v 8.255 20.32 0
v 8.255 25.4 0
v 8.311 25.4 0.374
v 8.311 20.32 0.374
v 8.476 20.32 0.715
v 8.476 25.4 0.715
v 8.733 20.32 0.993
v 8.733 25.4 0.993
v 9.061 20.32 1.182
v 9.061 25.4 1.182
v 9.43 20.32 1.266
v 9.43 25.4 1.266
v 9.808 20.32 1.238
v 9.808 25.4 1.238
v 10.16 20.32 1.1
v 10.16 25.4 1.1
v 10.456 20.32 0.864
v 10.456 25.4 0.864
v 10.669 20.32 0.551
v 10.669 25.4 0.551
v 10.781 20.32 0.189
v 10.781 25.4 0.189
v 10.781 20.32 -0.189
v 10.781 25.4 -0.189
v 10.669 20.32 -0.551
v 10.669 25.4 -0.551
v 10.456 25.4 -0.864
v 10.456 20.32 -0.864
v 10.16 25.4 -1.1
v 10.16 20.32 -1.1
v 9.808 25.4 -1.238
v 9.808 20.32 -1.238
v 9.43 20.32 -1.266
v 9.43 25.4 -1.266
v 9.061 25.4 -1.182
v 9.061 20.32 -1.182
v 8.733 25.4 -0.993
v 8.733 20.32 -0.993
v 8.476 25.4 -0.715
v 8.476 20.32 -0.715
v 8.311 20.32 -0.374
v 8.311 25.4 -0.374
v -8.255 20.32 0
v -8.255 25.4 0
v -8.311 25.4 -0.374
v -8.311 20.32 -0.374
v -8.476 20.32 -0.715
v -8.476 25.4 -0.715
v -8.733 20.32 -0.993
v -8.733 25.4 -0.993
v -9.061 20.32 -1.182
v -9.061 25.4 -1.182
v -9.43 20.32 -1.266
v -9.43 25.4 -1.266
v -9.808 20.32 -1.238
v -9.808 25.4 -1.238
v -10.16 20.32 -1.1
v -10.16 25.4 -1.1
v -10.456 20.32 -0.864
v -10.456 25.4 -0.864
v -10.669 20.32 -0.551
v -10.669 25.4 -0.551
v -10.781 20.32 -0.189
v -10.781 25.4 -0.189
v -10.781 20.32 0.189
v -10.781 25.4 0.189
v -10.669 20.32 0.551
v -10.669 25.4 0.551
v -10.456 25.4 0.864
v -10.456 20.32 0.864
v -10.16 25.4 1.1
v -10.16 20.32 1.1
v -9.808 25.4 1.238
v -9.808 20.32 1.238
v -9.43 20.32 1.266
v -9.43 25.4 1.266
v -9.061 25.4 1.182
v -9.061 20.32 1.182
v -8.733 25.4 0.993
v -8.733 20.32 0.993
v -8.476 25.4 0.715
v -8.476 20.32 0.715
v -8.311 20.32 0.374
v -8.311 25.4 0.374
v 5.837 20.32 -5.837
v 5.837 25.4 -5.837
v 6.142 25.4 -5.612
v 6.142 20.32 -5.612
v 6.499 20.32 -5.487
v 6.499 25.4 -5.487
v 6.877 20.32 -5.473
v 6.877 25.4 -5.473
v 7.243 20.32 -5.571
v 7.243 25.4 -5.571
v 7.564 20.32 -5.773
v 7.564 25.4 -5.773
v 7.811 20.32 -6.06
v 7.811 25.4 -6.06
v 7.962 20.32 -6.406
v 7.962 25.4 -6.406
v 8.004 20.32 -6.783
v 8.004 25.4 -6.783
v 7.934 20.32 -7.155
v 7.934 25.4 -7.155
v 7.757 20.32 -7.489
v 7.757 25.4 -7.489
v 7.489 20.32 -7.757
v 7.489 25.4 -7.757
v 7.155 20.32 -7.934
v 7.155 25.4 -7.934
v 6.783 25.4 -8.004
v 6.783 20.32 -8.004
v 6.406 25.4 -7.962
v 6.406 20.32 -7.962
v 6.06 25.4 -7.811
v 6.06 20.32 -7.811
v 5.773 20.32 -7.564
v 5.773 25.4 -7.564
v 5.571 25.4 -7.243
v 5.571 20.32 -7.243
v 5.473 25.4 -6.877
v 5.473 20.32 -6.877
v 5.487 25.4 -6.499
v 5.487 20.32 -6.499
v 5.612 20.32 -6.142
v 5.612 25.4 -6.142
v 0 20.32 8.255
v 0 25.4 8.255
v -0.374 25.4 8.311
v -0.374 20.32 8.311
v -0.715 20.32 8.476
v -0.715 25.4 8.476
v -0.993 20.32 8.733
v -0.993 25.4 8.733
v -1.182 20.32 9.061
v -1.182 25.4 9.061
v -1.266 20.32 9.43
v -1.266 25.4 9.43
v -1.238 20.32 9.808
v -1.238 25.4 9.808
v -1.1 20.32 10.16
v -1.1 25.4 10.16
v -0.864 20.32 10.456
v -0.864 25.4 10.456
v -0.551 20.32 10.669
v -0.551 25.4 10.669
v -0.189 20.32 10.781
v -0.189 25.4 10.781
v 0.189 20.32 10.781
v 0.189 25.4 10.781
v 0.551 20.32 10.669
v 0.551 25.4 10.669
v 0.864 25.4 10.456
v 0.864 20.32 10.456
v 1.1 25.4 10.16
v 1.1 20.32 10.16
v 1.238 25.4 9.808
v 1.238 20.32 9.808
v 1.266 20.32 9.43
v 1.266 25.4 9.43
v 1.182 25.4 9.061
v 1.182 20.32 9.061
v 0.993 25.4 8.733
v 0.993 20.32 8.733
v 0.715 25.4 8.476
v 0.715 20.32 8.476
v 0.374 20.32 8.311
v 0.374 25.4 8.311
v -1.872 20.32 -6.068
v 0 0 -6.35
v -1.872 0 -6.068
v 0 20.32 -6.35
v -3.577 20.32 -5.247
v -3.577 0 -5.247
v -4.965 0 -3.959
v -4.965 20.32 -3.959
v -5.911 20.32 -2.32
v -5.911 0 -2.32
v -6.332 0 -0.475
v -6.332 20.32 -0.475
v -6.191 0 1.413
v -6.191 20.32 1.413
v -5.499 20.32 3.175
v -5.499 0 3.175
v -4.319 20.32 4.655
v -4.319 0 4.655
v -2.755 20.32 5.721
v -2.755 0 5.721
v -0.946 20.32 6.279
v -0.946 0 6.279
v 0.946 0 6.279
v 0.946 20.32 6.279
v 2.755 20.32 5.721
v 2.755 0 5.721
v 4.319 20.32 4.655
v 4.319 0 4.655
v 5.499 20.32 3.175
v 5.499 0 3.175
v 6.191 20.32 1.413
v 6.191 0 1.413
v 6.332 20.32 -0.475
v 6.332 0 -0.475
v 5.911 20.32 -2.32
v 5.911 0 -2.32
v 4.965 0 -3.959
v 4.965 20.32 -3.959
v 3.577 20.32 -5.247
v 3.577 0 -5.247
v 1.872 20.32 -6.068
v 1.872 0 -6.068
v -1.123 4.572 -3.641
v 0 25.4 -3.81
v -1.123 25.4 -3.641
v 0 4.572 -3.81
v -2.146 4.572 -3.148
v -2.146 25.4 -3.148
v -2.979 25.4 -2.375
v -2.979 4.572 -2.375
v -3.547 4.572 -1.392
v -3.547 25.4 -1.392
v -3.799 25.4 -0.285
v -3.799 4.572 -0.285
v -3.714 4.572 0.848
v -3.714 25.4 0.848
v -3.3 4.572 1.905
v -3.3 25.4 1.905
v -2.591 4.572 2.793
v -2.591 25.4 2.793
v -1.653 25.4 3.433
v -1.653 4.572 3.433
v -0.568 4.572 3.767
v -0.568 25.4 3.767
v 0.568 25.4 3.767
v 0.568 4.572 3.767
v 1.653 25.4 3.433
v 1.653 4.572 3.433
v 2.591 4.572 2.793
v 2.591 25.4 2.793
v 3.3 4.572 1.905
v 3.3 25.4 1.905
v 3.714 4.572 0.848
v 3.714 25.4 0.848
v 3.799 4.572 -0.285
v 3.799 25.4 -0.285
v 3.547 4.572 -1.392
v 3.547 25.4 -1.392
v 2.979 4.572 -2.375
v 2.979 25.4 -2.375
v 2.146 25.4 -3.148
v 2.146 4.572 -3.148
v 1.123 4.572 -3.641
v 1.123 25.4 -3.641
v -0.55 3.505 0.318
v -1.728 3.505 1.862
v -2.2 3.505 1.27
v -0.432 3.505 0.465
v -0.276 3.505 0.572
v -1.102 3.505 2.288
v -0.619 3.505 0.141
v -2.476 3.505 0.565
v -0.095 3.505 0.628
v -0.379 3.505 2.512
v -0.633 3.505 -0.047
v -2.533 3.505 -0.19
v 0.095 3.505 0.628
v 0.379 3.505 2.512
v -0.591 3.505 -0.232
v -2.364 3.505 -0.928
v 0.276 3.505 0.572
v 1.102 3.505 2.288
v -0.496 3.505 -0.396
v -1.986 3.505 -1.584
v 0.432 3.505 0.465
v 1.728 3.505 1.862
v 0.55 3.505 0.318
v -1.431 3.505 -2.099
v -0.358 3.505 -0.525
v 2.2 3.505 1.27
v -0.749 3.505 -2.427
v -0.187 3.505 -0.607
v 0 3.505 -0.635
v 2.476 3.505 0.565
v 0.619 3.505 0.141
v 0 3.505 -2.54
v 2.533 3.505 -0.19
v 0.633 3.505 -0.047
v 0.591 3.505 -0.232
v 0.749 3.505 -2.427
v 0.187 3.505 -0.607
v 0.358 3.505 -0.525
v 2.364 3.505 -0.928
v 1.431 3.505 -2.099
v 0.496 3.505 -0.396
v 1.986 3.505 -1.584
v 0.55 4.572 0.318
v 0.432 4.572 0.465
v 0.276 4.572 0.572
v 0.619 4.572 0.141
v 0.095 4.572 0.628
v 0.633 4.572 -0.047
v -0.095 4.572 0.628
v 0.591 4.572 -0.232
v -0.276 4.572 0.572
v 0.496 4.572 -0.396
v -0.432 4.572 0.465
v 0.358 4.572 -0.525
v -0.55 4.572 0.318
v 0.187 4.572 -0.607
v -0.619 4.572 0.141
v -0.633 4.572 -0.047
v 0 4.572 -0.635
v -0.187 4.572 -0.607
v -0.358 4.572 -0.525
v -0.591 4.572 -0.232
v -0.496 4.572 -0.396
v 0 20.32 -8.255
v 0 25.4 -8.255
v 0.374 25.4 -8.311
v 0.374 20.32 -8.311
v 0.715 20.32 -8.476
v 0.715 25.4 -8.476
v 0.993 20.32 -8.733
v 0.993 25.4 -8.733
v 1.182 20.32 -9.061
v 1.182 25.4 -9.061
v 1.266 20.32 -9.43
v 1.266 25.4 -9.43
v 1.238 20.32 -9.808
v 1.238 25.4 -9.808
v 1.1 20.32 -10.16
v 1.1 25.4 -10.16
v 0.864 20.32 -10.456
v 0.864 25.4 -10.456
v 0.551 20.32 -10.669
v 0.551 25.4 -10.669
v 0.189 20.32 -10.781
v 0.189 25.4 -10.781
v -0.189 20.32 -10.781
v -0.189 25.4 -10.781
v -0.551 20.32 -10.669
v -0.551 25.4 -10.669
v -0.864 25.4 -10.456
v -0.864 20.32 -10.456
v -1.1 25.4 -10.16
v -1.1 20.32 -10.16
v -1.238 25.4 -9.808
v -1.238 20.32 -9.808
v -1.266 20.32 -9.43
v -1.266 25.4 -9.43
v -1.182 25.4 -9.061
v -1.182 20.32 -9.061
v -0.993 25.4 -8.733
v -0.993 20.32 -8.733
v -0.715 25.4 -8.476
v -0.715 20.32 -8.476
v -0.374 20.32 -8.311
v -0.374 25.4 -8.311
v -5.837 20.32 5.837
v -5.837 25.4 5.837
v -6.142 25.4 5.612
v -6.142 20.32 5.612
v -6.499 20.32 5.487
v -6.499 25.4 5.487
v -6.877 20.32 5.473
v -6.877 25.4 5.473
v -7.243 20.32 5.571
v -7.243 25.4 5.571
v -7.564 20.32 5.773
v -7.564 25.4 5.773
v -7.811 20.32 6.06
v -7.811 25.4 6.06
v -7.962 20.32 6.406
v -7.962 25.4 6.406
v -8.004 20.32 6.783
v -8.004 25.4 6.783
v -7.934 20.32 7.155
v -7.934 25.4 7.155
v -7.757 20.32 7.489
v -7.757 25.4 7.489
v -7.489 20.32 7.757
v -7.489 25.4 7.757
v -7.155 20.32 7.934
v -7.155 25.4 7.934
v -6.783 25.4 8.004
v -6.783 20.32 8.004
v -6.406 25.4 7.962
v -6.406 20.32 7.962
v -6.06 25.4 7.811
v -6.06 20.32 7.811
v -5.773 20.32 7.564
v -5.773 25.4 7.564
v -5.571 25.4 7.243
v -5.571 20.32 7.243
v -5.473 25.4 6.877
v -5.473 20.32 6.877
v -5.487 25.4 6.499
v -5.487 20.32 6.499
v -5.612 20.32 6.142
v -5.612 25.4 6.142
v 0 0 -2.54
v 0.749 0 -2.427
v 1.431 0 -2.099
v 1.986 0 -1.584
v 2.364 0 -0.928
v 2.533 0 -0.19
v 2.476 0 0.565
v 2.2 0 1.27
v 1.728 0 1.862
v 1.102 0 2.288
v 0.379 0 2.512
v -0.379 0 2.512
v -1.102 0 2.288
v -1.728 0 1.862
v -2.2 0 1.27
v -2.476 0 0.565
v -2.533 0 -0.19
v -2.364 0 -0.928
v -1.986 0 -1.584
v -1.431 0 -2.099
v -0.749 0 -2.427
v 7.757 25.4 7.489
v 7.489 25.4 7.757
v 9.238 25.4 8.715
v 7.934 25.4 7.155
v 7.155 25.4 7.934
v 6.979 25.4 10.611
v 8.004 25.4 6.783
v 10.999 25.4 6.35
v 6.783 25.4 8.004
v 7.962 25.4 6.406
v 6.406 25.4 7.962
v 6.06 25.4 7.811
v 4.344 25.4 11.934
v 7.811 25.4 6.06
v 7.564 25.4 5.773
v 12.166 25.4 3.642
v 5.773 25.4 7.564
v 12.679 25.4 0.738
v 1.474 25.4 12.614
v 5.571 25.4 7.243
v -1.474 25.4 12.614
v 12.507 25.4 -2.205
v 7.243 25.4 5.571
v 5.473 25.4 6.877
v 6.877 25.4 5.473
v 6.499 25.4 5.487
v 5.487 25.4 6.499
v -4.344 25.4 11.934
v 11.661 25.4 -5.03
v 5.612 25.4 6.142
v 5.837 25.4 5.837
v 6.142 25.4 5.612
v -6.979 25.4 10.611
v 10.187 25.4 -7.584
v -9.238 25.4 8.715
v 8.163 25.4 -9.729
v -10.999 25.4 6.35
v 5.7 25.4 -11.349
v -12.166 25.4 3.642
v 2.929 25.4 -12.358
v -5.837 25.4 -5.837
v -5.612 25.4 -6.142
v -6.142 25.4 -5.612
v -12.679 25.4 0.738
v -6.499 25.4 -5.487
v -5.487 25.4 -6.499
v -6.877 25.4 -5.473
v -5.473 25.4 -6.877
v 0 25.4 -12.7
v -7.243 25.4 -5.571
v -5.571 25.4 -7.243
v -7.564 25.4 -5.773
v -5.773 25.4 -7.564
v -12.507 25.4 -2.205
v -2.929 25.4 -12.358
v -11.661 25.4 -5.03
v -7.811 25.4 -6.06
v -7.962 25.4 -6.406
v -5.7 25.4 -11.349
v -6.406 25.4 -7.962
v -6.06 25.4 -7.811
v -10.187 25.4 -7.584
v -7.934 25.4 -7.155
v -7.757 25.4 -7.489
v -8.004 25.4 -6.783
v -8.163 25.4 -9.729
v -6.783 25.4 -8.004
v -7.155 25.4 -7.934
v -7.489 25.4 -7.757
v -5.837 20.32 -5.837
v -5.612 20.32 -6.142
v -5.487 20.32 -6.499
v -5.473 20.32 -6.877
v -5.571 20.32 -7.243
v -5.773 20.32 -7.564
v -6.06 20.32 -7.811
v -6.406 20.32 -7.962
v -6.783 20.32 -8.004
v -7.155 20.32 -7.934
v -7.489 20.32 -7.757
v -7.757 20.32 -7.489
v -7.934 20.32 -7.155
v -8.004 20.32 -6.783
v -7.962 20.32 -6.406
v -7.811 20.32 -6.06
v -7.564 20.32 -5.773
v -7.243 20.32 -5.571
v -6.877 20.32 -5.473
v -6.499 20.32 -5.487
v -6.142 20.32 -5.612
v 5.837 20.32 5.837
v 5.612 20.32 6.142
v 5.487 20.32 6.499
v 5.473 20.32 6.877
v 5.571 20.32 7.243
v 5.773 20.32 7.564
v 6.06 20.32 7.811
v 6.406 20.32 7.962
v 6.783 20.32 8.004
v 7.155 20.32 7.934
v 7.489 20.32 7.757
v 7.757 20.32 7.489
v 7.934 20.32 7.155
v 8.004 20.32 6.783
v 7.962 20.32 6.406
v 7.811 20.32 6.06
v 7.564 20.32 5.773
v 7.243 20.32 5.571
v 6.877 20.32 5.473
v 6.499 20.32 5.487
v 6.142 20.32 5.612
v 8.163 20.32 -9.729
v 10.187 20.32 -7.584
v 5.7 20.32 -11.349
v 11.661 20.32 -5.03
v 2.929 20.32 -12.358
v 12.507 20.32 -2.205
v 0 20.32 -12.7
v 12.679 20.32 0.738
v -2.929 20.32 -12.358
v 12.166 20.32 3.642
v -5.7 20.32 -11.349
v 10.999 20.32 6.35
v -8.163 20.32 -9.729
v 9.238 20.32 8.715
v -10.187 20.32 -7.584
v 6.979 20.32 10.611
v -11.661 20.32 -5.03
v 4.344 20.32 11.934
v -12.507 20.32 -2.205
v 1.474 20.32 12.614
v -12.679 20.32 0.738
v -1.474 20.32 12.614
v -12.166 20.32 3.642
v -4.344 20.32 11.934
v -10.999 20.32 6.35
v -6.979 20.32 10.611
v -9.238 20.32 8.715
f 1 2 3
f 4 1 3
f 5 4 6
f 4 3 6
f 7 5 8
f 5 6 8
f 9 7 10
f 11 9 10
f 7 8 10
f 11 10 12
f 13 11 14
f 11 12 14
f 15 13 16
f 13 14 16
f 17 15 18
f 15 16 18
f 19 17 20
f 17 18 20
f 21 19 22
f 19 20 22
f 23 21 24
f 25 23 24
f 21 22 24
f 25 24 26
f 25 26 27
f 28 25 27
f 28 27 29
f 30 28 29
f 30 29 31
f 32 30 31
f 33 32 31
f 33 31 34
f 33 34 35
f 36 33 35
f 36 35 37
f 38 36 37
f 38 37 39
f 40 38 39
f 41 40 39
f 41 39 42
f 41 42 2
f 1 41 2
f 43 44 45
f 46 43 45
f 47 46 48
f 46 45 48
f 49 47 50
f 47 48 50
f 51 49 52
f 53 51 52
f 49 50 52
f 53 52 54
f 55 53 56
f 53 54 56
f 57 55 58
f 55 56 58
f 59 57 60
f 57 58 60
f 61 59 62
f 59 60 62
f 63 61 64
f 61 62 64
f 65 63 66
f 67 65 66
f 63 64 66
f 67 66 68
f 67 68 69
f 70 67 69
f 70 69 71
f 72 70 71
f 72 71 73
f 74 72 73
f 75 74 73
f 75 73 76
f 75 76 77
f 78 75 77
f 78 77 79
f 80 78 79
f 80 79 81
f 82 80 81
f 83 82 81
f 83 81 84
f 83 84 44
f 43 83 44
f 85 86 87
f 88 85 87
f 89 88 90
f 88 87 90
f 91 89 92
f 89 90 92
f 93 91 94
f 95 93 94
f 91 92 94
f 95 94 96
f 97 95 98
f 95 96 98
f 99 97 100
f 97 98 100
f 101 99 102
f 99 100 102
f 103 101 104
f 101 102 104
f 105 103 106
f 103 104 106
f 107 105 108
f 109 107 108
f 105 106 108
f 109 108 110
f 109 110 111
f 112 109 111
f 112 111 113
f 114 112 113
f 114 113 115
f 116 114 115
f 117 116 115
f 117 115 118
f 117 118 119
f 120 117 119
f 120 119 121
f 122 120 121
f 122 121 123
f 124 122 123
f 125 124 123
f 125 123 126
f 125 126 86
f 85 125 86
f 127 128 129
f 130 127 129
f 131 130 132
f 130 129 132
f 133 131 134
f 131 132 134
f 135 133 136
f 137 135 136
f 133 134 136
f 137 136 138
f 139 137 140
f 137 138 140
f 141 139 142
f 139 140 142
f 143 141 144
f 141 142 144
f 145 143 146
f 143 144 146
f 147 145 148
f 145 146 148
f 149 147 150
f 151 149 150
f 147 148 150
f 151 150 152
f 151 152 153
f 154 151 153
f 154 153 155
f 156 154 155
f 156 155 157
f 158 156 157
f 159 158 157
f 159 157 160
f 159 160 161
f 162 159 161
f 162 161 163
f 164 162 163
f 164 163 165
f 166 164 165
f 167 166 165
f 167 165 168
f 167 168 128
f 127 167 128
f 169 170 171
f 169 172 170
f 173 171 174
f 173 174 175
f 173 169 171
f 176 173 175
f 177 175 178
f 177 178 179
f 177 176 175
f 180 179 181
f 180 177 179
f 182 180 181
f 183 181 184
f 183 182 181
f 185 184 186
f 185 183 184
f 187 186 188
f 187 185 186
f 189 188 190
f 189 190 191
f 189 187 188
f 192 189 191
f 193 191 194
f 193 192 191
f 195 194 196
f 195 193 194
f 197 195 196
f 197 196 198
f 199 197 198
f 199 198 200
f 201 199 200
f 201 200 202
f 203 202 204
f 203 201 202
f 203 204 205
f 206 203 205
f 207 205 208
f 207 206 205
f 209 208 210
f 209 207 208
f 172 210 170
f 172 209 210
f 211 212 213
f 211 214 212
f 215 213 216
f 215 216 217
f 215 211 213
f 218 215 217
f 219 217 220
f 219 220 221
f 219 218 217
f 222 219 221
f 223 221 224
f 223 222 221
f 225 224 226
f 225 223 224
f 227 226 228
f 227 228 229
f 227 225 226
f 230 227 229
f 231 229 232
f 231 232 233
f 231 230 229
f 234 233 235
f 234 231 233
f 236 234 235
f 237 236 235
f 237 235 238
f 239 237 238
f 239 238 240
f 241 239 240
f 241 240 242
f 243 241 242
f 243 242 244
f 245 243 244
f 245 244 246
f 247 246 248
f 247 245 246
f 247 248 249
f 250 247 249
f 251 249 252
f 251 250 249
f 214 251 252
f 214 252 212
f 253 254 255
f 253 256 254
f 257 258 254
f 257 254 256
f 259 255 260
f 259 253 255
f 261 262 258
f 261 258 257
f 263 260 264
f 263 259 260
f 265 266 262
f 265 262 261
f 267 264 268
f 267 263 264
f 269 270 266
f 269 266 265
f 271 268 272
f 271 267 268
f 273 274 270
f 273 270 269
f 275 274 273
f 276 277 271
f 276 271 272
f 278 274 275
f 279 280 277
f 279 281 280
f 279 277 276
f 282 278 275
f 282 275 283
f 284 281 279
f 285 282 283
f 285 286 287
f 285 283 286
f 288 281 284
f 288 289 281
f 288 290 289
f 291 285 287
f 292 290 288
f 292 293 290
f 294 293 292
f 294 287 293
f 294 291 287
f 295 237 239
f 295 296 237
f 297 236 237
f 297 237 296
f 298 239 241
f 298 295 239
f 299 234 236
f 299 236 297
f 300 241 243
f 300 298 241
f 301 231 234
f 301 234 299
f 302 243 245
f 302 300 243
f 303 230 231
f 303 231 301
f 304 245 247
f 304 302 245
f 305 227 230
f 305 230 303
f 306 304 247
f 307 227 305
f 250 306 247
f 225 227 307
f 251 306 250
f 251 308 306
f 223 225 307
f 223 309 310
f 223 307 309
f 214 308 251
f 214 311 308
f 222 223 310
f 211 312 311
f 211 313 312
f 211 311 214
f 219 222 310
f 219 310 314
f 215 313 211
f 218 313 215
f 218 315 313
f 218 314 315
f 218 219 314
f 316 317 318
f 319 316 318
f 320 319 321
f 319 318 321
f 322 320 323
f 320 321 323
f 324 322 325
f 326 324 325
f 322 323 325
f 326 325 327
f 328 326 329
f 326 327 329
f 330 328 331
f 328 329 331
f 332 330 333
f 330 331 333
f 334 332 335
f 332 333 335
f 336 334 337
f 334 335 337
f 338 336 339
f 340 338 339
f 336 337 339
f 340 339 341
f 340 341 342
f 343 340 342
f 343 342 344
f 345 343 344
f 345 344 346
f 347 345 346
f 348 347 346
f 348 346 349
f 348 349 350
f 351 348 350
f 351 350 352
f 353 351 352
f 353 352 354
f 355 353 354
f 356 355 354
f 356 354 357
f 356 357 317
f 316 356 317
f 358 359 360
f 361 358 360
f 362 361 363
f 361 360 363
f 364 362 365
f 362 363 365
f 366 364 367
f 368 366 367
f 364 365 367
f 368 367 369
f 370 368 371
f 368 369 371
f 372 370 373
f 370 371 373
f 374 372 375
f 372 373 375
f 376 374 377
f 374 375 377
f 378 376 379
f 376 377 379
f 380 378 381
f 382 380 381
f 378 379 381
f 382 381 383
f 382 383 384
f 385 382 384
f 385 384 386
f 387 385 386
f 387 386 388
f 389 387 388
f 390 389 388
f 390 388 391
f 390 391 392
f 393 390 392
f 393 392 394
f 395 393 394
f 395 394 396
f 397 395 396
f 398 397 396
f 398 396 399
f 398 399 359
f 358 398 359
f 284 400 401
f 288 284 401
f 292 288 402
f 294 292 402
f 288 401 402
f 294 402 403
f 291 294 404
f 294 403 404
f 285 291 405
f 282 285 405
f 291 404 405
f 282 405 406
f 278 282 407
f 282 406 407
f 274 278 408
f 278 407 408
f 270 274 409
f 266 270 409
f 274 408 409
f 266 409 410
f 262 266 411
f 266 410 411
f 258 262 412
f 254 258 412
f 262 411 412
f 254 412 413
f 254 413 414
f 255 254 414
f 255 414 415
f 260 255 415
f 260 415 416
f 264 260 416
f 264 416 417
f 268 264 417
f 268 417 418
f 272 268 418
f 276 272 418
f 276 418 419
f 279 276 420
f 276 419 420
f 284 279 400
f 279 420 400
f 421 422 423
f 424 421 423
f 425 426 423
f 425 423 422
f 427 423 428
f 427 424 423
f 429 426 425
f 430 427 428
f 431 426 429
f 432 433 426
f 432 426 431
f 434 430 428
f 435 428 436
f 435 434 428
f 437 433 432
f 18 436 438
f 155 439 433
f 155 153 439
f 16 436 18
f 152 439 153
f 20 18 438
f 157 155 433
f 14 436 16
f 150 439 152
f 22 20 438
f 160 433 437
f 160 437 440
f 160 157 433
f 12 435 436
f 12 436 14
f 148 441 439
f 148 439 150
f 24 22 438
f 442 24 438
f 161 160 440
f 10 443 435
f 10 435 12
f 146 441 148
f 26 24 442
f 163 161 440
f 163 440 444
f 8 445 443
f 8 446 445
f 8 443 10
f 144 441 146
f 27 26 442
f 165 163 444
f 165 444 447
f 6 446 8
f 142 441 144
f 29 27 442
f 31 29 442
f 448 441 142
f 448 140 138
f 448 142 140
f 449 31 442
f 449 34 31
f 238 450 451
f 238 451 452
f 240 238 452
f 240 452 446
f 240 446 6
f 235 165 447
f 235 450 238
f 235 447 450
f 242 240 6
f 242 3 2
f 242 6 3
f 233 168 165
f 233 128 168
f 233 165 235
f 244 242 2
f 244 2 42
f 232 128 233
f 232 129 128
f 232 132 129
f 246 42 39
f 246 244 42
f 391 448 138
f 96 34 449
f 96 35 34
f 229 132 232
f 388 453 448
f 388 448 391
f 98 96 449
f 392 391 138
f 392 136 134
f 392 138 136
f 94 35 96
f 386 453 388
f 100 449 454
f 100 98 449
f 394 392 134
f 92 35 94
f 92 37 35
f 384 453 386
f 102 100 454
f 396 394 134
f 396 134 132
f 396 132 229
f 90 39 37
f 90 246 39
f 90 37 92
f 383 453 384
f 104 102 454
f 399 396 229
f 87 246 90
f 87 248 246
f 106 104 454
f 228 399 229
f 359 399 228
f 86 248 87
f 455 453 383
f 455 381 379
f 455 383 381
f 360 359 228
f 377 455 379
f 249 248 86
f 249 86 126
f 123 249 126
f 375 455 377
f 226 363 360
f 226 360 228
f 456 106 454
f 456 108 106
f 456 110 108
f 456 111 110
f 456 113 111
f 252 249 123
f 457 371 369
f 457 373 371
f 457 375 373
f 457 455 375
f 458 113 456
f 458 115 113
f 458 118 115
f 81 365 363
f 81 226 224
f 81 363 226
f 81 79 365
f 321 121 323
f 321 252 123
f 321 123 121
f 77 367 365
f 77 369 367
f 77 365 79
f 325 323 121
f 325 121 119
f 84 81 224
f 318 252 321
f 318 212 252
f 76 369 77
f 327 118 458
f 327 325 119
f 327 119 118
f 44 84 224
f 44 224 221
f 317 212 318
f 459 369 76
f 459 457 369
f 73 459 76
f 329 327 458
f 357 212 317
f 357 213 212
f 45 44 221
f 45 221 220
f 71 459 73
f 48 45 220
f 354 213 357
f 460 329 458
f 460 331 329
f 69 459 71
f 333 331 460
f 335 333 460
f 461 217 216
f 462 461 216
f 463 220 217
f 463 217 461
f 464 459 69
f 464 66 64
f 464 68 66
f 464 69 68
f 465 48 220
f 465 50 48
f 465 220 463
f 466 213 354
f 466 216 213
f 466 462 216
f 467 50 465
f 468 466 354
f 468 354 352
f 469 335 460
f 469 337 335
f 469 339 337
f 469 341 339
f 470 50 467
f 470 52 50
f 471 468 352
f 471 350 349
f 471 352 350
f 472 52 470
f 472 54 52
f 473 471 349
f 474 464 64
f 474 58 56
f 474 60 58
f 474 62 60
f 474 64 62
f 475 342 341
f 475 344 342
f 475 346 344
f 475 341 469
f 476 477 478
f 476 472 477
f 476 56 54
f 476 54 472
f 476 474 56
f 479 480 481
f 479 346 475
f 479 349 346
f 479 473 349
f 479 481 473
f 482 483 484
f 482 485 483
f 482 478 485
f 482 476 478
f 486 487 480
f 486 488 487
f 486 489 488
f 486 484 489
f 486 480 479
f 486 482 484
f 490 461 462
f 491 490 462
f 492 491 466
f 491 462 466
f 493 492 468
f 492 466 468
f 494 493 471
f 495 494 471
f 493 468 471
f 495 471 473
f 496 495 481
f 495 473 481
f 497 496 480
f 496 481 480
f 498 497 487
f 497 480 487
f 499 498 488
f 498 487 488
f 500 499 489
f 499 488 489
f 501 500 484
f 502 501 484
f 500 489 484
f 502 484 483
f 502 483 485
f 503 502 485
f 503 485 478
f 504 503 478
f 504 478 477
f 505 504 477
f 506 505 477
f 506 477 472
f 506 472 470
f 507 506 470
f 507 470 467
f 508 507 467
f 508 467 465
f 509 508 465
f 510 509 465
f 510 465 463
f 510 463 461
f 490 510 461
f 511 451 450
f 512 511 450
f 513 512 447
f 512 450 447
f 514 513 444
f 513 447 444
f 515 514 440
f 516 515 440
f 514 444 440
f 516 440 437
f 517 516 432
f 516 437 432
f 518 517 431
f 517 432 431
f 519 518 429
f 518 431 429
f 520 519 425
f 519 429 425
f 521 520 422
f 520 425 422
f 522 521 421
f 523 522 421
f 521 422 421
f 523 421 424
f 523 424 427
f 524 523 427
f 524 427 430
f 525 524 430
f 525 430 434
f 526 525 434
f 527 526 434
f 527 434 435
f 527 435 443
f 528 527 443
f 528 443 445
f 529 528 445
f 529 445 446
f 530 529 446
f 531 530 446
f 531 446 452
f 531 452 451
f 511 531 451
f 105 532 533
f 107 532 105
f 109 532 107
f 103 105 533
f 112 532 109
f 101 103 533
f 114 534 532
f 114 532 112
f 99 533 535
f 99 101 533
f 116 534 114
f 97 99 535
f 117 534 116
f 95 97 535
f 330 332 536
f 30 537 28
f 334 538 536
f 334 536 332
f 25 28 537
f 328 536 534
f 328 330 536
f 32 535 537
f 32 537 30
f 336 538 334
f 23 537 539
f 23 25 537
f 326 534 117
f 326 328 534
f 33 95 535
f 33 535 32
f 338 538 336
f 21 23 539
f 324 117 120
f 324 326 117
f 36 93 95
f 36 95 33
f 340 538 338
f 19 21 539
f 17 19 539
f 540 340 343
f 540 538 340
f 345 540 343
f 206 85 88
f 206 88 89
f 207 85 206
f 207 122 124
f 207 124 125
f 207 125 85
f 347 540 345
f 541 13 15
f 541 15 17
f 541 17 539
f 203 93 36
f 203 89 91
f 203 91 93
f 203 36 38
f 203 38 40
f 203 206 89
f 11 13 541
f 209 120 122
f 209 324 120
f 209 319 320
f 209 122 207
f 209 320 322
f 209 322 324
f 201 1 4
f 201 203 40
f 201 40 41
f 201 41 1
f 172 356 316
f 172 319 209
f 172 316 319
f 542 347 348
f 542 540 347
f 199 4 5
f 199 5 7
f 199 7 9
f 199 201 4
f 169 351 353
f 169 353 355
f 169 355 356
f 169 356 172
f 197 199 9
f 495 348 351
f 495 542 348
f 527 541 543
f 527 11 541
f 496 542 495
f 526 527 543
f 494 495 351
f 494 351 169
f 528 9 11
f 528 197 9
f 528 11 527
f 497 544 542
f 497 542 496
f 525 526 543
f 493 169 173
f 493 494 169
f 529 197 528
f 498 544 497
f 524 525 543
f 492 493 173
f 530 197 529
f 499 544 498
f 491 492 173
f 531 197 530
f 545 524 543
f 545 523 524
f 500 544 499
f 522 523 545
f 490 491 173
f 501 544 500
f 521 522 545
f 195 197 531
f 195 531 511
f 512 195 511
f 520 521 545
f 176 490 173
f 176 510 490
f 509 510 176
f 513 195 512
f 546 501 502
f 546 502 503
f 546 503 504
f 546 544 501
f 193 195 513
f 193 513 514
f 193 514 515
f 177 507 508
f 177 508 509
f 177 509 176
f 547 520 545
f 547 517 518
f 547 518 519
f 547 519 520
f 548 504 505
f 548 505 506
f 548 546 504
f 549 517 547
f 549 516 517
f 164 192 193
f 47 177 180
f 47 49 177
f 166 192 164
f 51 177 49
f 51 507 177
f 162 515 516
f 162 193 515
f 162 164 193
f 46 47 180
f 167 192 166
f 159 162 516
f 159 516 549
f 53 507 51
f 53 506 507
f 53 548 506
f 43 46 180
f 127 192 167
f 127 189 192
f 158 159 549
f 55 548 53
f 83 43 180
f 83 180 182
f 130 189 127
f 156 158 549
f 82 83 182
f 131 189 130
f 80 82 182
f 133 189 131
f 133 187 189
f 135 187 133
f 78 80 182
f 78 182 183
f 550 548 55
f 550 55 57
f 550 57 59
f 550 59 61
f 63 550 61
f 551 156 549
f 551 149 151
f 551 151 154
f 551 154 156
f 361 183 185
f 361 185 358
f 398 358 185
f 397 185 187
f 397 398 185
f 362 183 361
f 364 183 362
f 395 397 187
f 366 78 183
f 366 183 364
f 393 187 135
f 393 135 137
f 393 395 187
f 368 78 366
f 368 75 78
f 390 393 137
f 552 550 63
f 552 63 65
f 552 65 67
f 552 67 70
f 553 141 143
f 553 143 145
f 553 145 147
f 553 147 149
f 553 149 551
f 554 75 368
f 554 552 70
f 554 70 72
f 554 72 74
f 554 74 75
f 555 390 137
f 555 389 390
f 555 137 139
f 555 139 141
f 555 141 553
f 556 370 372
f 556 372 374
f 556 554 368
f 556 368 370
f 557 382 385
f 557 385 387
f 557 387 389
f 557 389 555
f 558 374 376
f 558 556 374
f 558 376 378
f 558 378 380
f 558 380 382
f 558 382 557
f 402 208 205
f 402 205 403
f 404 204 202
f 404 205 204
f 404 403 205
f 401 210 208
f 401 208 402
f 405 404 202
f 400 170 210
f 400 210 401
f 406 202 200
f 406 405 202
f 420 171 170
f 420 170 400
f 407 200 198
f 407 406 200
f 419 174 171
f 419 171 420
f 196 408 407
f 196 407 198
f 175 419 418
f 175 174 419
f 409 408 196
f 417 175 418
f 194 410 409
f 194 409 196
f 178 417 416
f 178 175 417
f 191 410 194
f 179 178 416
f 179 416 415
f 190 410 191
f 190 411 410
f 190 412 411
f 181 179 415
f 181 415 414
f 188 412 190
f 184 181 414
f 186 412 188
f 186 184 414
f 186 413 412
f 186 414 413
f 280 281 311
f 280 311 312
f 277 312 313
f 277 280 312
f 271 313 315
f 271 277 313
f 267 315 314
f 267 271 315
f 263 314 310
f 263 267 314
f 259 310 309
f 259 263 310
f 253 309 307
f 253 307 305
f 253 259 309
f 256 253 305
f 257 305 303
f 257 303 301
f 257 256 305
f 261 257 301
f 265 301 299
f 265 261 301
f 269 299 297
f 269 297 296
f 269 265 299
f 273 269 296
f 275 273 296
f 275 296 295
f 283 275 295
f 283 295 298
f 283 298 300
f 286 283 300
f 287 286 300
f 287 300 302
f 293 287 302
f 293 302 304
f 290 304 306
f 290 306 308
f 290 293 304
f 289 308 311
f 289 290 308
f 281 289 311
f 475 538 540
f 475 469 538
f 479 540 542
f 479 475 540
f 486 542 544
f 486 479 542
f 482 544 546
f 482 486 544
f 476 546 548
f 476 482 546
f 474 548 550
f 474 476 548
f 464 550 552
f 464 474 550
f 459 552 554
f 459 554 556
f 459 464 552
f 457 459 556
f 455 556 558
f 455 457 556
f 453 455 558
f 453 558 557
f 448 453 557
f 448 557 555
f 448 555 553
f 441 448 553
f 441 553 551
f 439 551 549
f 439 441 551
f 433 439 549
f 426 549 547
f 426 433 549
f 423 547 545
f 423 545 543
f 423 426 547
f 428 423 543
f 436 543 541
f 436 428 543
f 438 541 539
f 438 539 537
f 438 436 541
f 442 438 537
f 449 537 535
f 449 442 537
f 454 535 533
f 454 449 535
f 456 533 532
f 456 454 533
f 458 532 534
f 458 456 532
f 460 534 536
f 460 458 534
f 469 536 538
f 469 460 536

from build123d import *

# Parameters (mm, degrees)
SKETCH2_R          = 2.54
CUT_EXTRUDE1_DEPTH = 3.5052
SKETCH4_R          = 1.27
CUT_EXTRUDE2_DEPTH = 32.108519733
CIRPATTERN1_COUNT  = 8


with BuildPart() as part:
    # Sketch1 → Revolve1 (revolve)
    with BuildSketch(Plane.XY, mode=Mode.PRIVATE) as revolve1_sk:
        Polygon((3.81, 25.4), (3.81, 4.572), (0.635, 4.572), (0.635, 0), (6.35, 0), (6.35, 20.32), (12.7, 20.32), (12.7, 25.4), align=None)
    revolve(revolve1_sk.sketch.rotate(Axis((0, 0, 0), (0, 1, 0)), 90), axis=Axis((0, 0, 0), (0, 1, 0)))

    # Sketch2 → Cut-Extrude1 (cut)
    with BuildSketch(Plane.XZ):
        with Locations(Location((0, 0, 0), (0, 0, 270))):
            Circle(SKETCH2_R)
    extrude(amount=-CUT_EXTRUDE1_DEPTH, mode=Mode.SUBTRACT)

    # Sketch4 → Cut-Extrude2 (cut, through all)
    with BuildSketch(Plane(origin=(0, 25.4, 0), x_dir=(1, 0, 0), z_dir=(0, 1, 0))):
        with Locations(Location((0, 9.525, 0), (0, 0, 270))):
            Circle(SKETCH4_R)
    cut_extrude2 = extrude(amount=-CUT_EXTRUDE2_DEPTH, mode=Mode.SUBTRACT)

    # CirPattern1: Cut-Extrude2 ×8 about axis
    cirpattern1_axis = Axis((0, 0, 0), (0, 1, 0))
    for i in range(1, CIRPATTERN1_COUNT):
        add(cut_extrude2.rotate(cirpattern1_axis, i * 360 / CIRPATTERN1_COUNT), mode=Mode.SUBTRACT)


solid = part.part
